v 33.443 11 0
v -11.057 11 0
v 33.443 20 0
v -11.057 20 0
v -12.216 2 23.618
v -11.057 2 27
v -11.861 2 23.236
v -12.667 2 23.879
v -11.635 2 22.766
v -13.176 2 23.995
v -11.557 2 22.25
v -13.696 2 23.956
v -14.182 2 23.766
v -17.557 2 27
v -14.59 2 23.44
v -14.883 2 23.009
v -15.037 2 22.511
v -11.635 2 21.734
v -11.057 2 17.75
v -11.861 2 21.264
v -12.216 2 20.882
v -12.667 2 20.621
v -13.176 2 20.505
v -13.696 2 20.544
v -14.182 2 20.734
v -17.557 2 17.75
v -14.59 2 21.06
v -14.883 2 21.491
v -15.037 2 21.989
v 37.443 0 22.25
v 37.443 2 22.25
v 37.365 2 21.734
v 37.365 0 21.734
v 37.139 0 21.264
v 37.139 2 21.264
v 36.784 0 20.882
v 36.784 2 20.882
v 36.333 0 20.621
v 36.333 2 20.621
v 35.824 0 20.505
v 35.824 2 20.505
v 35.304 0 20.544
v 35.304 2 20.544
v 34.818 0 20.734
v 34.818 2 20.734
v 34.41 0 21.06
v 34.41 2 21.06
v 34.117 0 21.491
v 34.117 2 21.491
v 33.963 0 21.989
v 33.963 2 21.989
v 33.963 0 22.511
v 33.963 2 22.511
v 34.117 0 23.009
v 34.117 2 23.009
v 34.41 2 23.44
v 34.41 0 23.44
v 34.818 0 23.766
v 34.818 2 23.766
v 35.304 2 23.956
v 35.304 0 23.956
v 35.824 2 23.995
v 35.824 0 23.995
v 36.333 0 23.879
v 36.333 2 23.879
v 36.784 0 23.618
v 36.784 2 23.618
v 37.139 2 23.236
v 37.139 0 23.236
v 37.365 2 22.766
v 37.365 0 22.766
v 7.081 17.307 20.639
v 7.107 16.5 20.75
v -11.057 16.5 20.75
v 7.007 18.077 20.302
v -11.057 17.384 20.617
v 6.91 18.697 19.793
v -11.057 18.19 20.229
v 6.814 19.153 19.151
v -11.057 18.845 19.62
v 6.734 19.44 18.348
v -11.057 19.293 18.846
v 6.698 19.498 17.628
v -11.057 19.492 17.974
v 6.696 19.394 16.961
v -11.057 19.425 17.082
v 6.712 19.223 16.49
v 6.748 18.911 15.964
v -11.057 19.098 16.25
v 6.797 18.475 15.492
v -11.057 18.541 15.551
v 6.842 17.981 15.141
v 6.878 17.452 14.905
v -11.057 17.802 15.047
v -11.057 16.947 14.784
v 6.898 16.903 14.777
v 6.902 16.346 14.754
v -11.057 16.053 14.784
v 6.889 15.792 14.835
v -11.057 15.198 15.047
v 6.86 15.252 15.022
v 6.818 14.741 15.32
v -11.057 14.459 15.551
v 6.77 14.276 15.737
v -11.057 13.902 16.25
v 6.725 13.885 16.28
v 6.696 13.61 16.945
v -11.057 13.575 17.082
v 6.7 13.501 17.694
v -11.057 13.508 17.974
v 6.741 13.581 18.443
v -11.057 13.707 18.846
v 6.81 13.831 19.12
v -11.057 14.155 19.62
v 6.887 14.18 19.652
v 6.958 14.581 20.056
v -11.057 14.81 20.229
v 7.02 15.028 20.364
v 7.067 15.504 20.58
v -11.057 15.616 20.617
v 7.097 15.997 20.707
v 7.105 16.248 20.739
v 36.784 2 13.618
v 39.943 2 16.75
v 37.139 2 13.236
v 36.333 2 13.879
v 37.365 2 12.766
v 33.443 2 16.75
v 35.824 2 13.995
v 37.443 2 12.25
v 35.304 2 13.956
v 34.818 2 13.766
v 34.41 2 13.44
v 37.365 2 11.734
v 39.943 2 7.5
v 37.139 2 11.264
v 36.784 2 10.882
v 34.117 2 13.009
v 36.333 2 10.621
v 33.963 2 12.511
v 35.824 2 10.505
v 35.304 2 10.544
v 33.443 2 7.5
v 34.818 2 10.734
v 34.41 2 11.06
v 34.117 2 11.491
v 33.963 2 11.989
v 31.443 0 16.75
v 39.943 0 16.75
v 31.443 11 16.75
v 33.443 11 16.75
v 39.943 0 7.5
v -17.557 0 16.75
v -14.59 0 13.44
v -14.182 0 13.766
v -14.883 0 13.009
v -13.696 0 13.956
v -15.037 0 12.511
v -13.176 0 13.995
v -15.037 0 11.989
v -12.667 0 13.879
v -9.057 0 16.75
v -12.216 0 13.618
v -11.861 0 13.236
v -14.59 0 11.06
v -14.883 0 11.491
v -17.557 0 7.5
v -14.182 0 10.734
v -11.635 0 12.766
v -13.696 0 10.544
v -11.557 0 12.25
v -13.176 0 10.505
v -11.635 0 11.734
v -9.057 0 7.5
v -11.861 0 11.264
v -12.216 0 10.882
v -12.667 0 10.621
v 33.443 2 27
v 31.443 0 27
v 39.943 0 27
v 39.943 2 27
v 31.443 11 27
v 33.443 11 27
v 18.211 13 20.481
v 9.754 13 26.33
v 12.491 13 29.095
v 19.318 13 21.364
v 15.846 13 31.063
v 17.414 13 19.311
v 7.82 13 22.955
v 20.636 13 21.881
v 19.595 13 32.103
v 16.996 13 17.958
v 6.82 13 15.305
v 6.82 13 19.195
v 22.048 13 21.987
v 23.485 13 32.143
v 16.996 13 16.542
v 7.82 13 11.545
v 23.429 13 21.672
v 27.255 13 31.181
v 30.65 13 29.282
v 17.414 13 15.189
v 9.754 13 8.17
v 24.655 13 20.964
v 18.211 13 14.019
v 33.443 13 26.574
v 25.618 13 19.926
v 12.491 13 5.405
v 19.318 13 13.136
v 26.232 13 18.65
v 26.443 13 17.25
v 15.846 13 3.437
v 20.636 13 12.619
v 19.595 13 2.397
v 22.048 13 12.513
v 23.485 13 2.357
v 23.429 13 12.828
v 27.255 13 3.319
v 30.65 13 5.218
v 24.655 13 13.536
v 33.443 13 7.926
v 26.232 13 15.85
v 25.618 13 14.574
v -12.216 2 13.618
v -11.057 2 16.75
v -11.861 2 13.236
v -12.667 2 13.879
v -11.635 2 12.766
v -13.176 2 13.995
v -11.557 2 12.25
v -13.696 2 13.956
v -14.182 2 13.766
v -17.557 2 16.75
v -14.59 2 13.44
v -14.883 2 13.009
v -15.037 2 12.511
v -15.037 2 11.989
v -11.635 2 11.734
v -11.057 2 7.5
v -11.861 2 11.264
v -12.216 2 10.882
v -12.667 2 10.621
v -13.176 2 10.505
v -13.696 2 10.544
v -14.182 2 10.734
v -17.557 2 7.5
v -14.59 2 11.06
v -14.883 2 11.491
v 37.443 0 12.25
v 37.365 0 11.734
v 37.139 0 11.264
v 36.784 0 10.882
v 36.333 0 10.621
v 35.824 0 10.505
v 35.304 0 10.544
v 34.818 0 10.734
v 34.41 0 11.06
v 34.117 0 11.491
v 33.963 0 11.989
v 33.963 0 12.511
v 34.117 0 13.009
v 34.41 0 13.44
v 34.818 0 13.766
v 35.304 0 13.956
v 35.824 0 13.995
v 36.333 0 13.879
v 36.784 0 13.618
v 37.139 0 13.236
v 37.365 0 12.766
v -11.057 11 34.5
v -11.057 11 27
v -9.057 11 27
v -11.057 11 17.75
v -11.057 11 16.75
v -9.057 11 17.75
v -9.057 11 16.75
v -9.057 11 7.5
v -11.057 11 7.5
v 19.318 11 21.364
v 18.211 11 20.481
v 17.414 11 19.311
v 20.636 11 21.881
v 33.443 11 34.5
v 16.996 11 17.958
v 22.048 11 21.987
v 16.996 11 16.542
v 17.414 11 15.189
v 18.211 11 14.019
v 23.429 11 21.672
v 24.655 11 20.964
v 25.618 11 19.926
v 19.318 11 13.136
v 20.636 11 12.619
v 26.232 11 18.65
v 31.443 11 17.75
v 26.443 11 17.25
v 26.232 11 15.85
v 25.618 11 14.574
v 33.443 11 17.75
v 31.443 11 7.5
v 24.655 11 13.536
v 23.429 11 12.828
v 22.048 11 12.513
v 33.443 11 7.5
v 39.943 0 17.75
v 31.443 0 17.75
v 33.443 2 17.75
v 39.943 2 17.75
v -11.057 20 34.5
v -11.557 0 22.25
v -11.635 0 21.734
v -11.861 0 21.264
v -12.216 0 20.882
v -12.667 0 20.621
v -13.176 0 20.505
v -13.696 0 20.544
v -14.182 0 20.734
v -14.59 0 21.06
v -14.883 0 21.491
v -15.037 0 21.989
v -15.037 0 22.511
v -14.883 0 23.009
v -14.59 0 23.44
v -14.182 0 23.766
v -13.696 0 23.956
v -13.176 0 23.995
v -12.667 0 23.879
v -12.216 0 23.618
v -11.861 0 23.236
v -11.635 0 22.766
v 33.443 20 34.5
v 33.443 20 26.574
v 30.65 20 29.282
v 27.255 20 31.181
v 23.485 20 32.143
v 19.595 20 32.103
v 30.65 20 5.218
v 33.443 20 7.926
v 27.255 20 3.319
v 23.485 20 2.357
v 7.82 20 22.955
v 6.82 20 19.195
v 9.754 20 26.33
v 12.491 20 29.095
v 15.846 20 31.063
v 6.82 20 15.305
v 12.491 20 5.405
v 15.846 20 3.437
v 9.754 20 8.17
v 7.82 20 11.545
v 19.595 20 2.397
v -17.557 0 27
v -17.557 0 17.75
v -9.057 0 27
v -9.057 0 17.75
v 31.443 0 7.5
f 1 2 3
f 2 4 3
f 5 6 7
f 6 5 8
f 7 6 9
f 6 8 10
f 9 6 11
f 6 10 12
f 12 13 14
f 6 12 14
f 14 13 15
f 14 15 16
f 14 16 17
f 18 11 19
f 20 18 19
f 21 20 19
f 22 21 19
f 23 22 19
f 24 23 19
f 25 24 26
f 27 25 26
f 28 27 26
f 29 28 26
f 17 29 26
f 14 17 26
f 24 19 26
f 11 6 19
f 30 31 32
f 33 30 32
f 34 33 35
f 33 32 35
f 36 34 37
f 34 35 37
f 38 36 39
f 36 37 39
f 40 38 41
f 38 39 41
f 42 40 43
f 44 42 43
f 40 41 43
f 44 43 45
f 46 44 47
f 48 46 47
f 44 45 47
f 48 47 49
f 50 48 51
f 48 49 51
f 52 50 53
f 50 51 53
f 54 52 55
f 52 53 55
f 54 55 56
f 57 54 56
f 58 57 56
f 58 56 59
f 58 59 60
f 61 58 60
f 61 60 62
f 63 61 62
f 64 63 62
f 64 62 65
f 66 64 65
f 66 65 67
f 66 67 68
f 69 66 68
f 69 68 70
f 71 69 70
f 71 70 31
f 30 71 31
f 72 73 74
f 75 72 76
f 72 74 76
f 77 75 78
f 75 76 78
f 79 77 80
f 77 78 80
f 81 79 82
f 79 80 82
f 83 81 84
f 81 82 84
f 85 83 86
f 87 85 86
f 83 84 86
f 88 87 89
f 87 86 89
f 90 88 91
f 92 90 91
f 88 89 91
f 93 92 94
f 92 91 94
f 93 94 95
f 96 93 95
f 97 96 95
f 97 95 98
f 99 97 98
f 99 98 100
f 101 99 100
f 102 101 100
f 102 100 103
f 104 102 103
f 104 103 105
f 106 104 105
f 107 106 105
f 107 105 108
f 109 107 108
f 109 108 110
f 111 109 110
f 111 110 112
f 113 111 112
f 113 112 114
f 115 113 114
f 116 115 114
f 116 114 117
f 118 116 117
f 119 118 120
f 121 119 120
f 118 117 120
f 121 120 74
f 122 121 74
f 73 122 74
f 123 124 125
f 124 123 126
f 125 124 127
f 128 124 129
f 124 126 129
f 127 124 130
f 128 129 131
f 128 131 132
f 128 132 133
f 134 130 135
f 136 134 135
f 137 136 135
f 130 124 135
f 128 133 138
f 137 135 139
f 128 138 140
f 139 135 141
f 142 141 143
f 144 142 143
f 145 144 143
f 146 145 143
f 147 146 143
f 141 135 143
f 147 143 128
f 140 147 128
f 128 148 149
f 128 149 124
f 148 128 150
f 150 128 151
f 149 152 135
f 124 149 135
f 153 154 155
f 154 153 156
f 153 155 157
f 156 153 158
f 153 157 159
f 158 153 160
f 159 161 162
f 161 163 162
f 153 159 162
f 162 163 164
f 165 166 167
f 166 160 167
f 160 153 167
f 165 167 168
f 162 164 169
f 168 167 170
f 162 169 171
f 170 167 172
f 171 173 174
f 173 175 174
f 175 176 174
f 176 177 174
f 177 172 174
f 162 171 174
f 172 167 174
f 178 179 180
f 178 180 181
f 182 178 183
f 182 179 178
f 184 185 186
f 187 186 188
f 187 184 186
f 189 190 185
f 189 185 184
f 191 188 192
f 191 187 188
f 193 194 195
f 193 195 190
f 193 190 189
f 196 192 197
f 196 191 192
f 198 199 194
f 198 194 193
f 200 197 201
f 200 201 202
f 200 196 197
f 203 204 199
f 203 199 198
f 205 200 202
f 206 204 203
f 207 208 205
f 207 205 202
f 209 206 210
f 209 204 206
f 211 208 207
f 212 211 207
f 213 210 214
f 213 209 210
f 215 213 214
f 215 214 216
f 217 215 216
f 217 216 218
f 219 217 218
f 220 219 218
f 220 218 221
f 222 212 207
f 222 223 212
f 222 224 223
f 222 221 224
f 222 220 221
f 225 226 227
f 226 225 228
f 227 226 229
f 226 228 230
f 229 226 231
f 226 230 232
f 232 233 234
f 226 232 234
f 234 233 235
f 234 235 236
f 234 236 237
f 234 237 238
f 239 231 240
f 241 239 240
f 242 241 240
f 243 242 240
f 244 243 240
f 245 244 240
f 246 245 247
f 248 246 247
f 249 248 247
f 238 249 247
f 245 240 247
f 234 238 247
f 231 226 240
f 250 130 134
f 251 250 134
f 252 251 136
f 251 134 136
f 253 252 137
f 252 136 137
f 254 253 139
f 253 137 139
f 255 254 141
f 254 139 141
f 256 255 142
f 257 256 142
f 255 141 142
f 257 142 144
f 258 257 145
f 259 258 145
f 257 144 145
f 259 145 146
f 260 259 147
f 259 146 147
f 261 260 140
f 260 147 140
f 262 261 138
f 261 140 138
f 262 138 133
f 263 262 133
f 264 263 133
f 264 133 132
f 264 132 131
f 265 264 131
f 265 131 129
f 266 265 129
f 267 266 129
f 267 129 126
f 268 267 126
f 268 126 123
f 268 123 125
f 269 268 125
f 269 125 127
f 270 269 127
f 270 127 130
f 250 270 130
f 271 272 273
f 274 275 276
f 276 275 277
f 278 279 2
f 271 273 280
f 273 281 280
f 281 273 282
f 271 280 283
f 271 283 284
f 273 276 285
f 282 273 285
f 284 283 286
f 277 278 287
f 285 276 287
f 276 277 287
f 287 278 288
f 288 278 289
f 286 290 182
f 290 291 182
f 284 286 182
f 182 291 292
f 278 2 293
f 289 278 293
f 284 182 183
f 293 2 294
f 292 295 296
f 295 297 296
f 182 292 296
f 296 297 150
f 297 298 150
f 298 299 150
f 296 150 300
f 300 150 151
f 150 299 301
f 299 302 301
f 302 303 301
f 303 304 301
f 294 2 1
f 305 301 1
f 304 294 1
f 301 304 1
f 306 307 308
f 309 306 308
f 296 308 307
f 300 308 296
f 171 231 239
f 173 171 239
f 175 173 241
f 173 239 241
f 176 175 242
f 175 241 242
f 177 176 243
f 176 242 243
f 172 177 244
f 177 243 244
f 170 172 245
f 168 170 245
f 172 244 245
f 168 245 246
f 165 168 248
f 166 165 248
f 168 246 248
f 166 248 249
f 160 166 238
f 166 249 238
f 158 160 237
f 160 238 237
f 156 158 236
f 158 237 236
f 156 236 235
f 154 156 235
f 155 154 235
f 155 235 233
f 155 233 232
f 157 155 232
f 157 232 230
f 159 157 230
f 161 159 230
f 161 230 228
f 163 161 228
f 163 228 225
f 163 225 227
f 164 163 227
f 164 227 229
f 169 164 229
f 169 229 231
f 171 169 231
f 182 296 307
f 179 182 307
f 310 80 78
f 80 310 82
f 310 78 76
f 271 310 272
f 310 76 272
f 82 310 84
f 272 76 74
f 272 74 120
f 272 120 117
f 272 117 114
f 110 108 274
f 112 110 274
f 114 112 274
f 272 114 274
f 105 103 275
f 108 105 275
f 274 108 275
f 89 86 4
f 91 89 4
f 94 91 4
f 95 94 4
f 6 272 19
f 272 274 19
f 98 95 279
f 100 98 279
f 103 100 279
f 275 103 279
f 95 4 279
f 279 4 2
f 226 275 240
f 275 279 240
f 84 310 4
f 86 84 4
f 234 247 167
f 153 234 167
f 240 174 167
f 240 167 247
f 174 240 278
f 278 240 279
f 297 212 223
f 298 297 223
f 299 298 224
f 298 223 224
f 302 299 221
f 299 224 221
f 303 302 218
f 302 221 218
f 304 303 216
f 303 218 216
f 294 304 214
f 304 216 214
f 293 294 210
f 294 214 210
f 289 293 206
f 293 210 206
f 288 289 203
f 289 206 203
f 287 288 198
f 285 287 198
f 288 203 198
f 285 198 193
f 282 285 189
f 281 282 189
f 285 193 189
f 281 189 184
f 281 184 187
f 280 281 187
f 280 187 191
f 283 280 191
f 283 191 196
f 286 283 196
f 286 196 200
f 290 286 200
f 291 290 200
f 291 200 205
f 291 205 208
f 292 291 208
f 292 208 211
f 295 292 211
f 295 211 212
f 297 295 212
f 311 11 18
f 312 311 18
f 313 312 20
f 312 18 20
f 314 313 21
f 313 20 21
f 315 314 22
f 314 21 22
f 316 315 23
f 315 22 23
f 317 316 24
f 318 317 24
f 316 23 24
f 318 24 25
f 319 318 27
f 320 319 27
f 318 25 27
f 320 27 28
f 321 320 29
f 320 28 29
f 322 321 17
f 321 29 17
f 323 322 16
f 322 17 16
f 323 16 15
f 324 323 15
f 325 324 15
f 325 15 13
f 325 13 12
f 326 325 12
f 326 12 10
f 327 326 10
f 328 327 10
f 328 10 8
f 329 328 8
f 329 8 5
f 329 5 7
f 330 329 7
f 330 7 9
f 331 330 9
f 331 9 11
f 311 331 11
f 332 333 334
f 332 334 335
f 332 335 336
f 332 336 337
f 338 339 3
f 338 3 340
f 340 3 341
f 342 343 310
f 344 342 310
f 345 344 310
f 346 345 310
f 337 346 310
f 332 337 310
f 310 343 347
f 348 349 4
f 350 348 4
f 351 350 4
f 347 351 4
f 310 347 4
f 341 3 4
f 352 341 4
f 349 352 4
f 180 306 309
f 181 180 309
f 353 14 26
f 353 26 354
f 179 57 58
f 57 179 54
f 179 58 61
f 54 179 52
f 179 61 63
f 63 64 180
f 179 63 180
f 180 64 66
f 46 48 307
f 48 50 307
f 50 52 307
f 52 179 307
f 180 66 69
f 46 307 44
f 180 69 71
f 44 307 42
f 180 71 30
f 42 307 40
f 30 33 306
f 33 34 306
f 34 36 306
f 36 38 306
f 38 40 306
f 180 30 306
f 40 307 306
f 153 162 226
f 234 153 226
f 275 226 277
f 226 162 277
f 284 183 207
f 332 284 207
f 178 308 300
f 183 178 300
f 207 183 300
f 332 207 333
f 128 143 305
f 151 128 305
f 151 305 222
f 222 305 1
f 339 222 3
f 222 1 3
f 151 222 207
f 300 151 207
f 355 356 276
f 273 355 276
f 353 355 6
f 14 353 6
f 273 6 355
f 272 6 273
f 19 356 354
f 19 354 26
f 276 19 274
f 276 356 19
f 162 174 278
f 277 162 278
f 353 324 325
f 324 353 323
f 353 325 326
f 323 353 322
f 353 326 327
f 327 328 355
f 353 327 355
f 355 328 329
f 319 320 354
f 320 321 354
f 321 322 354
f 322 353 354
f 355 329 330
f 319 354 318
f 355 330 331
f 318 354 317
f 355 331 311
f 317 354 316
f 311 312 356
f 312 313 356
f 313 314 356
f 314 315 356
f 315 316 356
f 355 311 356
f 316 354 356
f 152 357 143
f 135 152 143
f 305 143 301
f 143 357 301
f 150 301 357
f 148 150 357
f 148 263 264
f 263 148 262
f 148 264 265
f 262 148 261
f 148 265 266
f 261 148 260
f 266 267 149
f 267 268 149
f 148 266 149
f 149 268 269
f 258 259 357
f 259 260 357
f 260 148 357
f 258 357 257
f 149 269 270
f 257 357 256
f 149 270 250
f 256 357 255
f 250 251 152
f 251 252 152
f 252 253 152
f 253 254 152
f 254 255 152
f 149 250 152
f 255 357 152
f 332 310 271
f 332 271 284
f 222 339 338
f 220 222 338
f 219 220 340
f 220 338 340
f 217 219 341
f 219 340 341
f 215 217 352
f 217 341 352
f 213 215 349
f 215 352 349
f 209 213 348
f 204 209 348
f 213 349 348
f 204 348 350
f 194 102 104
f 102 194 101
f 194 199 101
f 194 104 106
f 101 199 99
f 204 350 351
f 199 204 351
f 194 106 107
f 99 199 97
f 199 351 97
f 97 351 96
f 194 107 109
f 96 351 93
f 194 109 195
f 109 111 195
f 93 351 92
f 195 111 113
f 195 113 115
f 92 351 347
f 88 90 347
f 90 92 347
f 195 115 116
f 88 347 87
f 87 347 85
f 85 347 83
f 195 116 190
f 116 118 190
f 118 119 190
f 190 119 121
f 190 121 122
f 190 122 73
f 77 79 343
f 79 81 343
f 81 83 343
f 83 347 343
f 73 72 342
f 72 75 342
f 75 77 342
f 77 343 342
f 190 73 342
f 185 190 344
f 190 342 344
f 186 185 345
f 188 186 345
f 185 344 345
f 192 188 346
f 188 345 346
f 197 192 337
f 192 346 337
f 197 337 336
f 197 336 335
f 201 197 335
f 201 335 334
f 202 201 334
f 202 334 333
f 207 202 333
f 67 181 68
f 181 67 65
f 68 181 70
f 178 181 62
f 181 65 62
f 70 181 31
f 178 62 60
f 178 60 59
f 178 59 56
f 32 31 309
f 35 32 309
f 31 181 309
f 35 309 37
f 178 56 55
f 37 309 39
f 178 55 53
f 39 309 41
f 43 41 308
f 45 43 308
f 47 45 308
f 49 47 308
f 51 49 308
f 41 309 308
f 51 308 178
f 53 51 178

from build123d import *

# Parameters (mm, degrees)
BOSS_EXTRUDE1_DEPTH = 34.5
SKETCH3_R           = 15
CUT_EXTRUDE1_DEPTH  = 7
SKETCH4_W           = 7.5
SKETCH4_H           = 11
CUT_EXTRUDE2_DEPTH  = 58.5
SKETCH5_R           = 4.75
CUT_EXTRUDE3_DEPTH  = 14
SKETCH6_W           = 1
SKETCH6_H           = 11
CUT_EXTRUDE4_DEPTH  = 58.5
CUT_EXTRUDE5_REACH  = 53
SKETCH7_R           = 3
SKETCH8_R           = 1.75
CUT_EXTRUDE6_DEPTH  = 3


with BuildPart() as part:
    # Sketch1 → Boss-Extrude1 (new body)
    with BuildSketch(Plane.XY):
        Polygon((-9.056756757, 11), (31.443243243, 11), (31.443243243, 0), (39.943243243, 0), (39.943243243, 2), (33.443243243, 2), (33.443243243, 20), (-11.056756757, 20), (-11.056756757, 2), (-17.556756757, 2), (-17.556756757, 0), (-9.056756757, 0), align=None)
    extrude(amount=BOSS_EXTRUDE1_DEPTH)

    # Sketch3 → Cut-Extrude1 (cut)
    with BuildSketch(Plane(origin=(0, 20, 0), x_dir=(1, 0, 0), z_dir=(0, 1, 0))):
        with Locations((21.693243243, -17.25)):
            Circle(SKETCH3_R)
    extrude(amount=-CUT_EXTRUDE1_DEPTH, mode=Mode.SUBTRACT)

    # Sketch4 → Cut-Extrude2 (cut, through all)
    with BuildSketch(Plane.ZY.offset(17.556756757)):
        with Locations((3.75, 5.5)):
            Rectangle(SKETCH4_W, SKETCH4_H)
        with Locations((30.75, 5.5)):
            Rectangle(SKETCH4_W, SKETCH4_H)
    extrude(amount=-CUT_EXTRUDE2_DEPTH, mode=Mode.SUBTRACT)

    # Sketch5 → Cut-Extrude3 (cut, through all)
    with BuildSketch(Plane(origin=(0, 13, 0), x_dir=(1, 0, 0), z_dir=(0, 1, 0))):
        with Locations((21.693243243, -17.25)):
            Circle(SKETCH5_R)
    extrude(amount=-CUT_EXTRUDE3_DEPTH, mode=Mode.SUBTRACT)

    # Sketch6 → Cut-Extrude4 (cut, through all)
    with BuildSketch(Plane(origin=(39.943243243, 0, 0), x_dir=(0, 0, -1), z_dir=(1, 0, 0))):
        with Locations((-17.25, 5.5)):
            Rectangle(SKETCH6_W, SKETCH6_H)
    extrude(amount=-CUT_EXTRUDE4_DEPTH, mode=Mode.SUBTRACT)

    # Sketch7 → Cut-Extrude5 (cut, up to next)
    with BuildSketch(Plane.ZY.offset(11.056756757), mode=Mode.PRIVATE) as cut_extrude5_sk1:
        with Locations((17.75, 16.5)):
            Circle(SKETCH7_R)
    cut_extrude5_tool1 = extrude(cut_extrude5_sk1.sketch, amount=-CUT_EXTRUDE5_REACH, mode=Mode.PRIVATE) & part.part
    add(cut_extrude5_tool1.solids().sort_by_distance((-11.056757, 16.5, 17.75))[0], mode=Mode.SUBTRACT)

    # Sketch8 → Cut-Extrude6 (cut, through all)
    with BuildSketch(Plane(origin=(0, 2, 0), x_dir=(1, 0, 0), z_dir=(0, 1, 0))):
        with Locations((-13.306756757, -12.25)):
            Circle(SKETCH8_R)
        with Locations((-13.306756757, -22.25)):
            Circle(SKETCH8_R)
        with Locations((35.693243243, -22.25)):
            Circle(SKETCH8_R)
        with Locations((35.693243243, -12.25)):
            Circle(SKETCH8_R)
    extrude(amount=-CUT_EXTRUDE6_DEPTH, mode=Mode.SUBTRACT)


solid = part.part
